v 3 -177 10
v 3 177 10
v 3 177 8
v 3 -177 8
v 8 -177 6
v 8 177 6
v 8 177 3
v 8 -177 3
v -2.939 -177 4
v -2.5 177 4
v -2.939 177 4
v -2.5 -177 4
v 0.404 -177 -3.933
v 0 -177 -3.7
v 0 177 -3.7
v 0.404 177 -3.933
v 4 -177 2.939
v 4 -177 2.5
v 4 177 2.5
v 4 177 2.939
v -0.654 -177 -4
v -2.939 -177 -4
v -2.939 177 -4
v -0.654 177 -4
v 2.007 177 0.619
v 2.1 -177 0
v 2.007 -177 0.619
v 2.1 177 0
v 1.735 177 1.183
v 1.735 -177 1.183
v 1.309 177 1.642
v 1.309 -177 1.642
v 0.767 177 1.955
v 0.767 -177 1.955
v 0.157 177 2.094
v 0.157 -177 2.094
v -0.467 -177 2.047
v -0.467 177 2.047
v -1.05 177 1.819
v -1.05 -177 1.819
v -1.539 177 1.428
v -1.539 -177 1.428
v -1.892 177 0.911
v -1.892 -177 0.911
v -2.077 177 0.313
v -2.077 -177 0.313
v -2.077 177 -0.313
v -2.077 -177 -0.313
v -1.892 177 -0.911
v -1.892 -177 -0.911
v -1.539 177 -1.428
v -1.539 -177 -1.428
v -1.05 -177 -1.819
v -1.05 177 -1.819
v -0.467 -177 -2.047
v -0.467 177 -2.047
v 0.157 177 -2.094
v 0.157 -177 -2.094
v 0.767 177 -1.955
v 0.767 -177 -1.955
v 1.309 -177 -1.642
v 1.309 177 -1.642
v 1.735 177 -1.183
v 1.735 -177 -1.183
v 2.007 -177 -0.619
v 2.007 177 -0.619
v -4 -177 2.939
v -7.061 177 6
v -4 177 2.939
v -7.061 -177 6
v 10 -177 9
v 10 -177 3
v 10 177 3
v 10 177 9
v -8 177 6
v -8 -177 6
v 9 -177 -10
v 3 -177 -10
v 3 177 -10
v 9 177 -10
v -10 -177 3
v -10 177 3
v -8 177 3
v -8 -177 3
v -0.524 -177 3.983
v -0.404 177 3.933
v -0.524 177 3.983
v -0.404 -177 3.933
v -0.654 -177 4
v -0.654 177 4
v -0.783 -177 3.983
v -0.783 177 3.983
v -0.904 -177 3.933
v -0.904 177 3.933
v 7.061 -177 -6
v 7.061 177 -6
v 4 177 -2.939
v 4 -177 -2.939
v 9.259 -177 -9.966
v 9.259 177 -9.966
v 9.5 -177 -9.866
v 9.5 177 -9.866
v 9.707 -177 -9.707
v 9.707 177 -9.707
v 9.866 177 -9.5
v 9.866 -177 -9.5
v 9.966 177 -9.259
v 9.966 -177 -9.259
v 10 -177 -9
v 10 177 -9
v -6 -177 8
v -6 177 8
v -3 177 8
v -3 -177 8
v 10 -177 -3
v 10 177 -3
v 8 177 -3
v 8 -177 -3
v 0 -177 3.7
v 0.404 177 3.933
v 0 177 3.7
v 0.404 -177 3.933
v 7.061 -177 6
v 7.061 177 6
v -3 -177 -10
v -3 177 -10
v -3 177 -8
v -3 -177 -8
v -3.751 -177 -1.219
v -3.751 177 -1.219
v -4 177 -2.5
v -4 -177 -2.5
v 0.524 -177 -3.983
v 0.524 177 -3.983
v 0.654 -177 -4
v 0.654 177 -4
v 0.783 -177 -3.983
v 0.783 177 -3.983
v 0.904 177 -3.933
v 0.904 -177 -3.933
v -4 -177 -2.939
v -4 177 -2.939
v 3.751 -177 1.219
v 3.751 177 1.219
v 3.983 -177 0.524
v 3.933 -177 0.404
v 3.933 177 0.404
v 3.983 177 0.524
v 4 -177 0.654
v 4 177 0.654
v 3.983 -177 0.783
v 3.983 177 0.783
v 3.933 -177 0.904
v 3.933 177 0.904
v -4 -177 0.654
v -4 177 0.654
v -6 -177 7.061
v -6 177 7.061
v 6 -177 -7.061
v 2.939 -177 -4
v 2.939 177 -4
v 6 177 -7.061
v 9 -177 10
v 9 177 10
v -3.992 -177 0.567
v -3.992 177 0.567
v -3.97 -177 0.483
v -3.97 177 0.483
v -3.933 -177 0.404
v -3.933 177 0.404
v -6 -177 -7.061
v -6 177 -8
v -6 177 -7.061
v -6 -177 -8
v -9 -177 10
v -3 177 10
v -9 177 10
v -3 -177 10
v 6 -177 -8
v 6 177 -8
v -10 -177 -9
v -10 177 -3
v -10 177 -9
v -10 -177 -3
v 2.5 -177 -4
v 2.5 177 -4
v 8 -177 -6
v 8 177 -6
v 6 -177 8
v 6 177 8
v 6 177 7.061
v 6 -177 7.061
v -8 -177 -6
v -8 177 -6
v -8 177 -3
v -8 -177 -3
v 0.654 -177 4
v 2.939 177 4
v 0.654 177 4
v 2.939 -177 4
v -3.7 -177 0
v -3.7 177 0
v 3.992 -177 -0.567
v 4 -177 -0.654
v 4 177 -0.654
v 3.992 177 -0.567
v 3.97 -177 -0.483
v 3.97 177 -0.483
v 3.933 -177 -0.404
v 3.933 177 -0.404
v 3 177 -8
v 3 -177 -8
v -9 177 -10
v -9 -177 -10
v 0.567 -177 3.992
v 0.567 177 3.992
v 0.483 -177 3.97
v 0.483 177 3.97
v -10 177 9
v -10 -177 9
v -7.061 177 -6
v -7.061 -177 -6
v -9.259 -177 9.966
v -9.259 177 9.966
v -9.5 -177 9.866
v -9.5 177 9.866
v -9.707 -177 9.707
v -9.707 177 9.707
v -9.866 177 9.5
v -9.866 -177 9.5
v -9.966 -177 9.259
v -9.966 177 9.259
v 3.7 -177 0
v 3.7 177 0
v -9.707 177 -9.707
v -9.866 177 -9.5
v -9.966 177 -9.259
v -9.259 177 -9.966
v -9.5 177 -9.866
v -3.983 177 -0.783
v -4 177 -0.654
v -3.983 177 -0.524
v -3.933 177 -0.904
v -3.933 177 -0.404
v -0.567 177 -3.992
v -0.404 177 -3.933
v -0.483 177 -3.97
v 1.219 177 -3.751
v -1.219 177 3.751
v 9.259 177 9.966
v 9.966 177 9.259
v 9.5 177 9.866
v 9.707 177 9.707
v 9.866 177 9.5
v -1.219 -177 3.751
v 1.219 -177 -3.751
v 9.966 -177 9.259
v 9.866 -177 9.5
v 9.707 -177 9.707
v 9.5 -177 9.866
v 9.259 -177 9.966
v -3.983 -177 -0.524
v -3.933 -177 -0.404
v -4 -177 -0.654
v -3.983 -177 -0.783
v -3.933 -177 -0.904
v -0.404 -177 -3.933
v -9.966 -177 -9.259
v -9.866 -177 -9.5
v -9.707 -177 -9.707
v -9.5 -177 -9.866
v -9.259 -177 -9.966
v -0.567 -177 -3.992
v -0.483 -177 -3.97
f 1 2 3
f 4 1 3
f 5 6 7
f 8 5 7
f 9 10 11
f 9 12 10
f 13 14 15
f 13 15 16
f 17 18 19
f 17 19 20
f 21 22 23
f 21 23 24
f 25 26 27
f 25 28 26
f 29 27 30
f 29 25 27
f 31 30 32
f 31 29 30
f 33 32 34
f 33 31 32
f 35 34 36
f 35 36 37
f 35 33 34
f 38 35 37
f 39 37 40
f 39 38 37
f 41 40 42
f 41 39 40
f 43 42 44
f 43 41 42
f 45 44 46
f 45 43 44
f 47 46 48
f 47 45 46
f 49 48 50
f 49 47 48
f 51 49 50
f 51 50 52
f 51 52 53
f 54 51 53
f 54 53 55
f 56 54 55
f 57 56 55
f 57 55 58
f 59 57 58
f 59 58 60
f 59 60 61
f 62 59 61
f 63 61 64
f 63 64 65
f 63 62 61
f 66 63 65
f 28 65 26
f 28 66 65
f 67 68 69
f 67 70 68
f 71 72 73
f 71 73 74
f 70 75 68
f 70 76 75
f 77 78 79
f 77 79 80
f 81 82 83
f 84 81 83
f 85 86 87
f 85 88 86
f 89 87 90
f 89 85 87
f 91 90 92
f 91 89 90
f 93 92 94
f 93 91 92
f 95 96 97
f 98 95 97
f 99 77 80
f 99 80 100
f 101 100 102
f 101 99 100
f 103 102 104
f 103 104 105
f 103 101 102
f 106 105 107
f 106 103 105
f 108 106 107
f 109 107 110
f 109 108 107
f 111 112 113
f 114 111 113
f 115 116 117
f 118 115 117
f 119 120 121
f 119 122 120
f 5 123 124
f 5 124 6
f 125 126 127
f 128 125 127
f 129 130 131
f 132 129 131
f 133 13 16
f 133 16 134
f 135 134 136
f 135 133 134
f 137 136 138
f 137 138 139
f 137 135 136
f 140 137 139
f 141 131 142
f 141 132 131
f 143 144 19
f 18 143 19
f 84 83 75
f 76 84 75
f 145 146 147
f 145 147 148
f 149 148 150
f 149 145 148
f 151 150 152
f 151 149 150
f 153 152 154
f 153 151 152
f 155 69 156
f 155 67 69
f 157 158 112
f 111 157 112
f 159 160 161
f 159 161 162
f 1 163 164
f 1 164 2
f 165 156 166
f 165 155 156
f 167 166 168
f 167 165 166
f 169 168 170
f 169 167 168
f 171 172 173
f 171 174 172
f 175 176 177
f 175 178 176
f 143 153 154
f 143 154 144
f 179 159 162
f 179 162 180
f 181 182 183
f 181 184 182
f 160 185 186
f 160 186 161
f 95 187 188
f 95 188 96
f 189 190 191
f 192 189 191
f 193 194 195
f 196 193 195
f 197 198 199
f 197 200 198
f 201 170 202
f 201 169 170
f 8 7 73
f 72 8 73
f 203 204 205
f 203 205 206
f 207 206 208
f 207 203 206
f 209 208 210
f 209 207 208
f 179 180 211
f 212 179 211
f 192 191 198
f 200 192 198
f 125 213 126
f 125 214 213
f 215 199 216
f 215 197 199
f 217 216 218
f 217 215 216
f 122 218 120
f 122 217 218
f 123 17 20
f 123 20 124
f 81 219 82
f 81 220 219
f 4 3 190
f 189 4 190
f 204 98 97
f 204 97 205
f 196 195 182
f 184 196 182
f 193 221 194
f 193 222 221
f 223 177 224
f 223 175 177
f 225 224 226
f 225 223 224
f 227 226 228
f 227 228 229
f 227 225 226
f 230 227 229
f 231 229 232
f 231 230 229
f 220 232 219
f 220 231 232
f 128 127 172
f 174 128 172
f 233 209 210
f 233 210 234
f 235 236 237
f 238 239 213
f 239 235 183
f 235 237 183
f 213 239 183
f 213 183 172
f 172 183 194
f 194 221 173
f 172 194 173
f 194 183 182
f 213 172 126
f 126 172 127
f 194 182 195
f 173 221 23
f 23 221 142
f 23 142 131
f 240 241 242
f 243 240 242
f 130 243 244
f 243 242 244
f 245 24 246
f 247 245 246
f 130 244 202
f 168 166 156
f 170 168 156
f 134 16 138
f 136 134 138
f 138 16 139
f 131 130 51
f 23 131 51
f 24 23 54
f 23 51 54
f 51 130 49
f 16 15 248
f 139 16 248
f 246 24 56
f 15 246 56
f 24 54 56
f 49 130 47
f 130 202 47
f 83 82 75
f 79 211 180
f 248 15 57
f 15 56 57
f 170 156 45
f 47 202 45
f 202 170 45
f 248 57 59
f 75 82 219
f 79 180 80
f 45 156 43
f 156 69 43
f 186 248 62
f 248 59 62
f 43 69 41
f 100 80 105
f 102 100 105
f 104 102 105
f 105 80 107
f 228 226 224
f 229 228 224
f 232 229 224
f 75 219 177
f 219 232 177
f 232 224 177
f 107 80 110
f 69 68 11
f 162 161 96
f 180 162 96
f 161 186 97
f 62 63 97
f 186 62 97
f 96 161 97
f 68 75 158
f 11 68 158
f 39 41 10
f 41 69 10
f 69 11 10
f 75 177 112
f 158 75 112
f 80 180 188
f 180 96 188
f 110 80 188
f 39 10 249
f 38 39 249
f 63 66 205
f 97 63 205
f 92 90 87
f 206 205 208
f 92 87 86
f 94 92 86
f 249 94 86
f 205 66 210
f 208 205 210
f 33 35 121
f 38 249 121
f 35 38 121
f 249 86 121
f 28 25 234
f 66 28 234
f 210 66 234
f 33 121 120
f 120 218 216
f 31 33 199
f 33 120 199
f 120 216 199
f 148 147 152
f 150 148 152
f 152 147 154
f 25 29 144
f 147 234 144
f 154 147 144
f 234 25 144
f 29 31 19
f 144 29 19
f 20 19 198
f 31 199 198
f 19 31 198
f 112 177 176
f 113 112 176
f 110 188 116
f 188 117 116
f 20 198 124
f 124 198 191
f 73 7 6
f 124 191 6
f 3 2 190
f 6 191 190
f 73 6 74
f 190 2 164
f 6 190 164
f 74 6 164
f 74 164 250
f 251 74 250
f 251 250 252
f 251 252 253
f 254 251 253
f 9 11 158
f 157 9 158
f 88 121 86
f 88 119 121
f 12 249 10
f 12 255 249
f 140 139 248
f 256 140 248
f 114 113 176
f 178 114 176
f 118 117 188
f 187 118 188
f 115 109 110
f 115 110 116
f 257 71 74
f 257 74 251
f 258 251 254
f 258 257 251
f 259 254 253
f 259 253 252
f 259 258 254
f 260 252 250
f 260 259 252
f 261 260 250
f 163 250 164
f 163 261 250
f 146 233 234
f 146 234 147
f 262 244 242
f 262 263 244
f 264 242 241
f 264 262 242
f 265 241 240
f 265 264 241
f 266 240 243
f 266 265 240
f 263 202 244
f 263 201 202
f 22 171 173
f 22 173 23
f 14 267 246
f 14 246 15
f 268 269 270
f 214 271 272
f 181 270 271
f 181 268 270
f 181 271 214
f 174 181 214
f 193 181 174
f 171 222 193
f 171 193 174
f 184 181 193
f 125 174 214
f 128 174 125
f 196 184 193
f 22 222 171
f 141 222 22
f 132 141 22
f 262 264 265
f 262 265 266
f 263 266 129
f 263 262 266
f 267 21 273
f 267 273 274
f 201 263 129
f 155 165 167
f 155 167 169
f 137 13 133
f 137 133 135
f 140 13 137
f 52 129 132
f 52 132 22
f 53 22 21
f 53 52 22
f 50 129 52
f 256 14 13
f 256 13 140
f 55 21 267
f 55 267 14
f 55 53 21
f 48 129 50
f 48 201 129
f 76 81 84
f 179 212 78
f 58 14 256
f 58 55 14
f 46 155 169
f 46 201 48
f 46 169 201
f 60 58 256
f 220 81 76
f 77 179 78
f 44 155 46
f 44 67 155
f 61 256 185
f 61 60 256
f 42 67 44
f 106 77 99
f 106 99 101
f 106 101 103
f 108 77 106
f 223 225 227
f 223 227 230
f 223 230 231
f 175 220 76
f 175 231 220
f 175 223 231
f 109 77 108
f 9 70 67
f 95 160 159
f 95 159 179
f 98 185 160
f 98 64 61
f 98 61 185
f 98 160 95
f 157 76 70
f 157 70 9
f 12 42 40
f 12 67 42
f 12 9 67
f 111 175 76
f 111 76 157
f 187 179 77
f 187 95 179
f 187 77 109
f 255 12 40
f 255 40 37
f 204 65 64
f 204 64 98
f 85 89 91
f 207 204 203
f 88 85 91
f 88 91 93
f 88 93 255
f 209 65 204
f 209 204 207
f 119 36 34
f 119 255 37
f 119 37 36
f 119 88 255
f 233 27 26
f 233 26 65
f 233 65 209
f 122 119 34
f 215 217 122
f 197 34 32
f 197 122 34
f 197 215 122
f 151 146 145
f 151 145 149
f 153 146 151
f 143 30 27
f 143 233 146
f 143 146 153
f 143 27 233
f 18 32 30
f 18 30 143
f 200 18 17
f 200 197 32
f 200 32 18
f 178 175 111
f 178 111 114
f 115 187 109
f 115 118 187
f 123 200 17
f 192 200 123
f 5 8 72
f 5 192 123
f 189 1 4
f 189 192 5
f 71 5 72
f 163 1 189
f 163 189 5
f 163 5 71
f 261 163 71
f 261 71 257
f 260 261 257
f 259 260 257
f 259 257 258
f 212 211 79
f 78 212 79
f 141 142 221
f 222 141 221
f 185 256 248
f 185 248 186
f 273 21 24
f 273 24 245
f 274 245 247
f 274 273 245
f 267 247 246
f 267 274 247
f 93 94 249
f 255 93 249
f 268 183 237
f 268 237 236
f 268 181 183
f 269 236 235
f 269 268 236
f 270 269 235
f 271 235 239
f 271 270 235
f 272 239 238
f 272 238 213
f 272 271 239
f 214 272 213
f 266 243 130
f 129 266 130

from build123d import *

# Parameters (mm, degrees)
F0_R     = 2.1
F1_DEPTH = 177


with BuildPart() as f1:
    # F0 (on Front) → F1 (new body, symmetric)
    with BuildSketch(Plane.XZ):
        with BuildLine():
            Line((-5.999985, -8.000007), (-5.999985, -7.060667))
            Line((-5.999985, -7.060667), (-2.939325, -4.000007))
            Line((-2.939325, -4.000007), (-0.653575, -4.000007))
            ThreePointArc((-0.653575, -4.000007), (-0.524165, -3.982969), (-0.403575, -3.933019))
            Line((-0.403575, -3.933019), (1.5e-05, -3.700007))
            Line((1.5e-05, -3.700007), (0.403605, -3.933019))
            ThreePointArc((0.403605, -3.933019), (0.653605, -4.000007), (0.903605, -3.933019))
            Line((0.903605, -3.933019), (1.218901, -3.750983))
            Line((1.218901, -3.750983), (2.500015, -4.000007))
            Line((2.500015, -4.000007), (2.939355, -4.000007))
            Line((2.939355, -4.000007), (6.000015, -7.060667))
            Line((6.000015, -7.060667), (6.000015, -8.000007))
            Line((6.000015, -8.000007), (3.000015, -8.000007))
            Line((3.000015, -8.000007), (3.000015, -10.000007))
            Line((3.000015, -10.000007), (9.000015, -10.000007))
            ThreePointArc((9.000015, -10.000007), (9.707122, -9.707113), (10.000015, -9.000007))
            Line((10.000015, -9.000007), (10.000015, -3.000007))
            Line((10.000015, -3.000007), (8.000015, -3.000007))
            Line((8.000015, -3.000007), (8.000015, -6.000007))
            Line((8.000015, -6.000007), (7.060675, -6.000007))
            Line((7.060675, -6.000007), (4.000015, -2.939346))
            Line((4.000015, -2.939346), (4.000015, -0.653596))
            ThreePointArc((4.000015, -0.653596), (3.982978, -0.524187), (3.933028, -0.403596))
            Line((3.933028, -0.403596), (3.700015, -7e-06))
            Line((3.700015, -7e-06), (3.933028, 0.403583))
            ThreePointArc((3.933028, 0.403583), (4.000015, 0.653583), (3.933028, 0.903583))
            Line((3.933028, 0.903583), (3.750992, 1.218879))
            Line((3.750992, 1.218879), (4.000015, 2.499993))
            Line((4.000015, 2.499993), (4.000015, 2.939333))
            Line((4.000015, 2.939333), (7.060675, 5.999993))
            Line((7.060675, 5.999993), (8.000015, 5.999993))
            Line((8.000015, 5.999993), (8.000015, 2.999993))
            Line((8.000015, 2.999993), (10.000015, 2.999993))
            Line((10.000015, 2.999993), (10.000015, 8.999993))
            ThreePointArc((10.000015, 8.999993), (9.707122, 9.7071), (9.000015, 9.999993))
            Line((9.000015, 9.999993), (3.000015, 9.999993))
            Line((3.000015, 9.999993), (3.000015, 7.999993))
            Line((3.000015, 7.999993), (6.000015, 7.999993))
            Line((6.000015, 7.999993), (6.000015, 7.060654))
            Line((6.000015, 7.060654), (2.939355, 3.999993))
            Line((2.939355, 3.999993), (0.653605, 3.999993))
            ThreePointArc((0.653605, 3.999993), (0.524195, 3.982956), (0.403605, 3.933006))
            Line((0.403605, 3.933006), (1.5e-05, 3.699993))
            Line((1.5e-05, 3.699993), (-0.403575, 3.933006))
            ThreePointArc((-0.403575, 3.933006), (-0.653575, 3.999993), (-0.903575, 3.933006))
            Line((-0.903575, 3.933006), (-1.218871, 3.75097))
            Line((-1.218871, 3.75097), (-2.499985, 3.999993))
            Line((-2.499985, 3.999993), (-2.939325, 3.999993))
            Line((-2.939325, 3.999993), (-5.999985, 7.060654))
            Line((-5.999985, 7.060654), (-5.999985, 7.999993))
            Line((-5.999985, 7.999993), (-2.999985, 7.999993))
            Line((-2.999985, 7.999993), (-2.999985, 9.999993))
            Line((-2.999985, 9.999993), (-8.999985, 9.999993))
            ThreePointArc((-8.999985, 9.999993), (-9.707092, 9.7071), (-9.999985, 8.999993))
            Line((-9.999985, 8.999993), (-9.999985, 2.999993))
            Line((-9.999985, 2.999993), (-7.999985, 2.999993))
            Line((-7.999985, 2.999993), (-7.999985, 5.999993))
            Line((-7.999985, 5.999993), (-7.060645, 5.999993))
            Line((-7.060645, 5.999993), (-3.999985, 2.939333))
            Line((-3.999985, 2.939333), (-3.999985, 0.653583))
            ThreePointArc((-3.999985, 0.653583), (-3.982948, 0.524174), (-3.932998, 0.403583))
            Line((-3.932998, 0.403583), (-3.699985, -7e-06))
            Line((-3.699985, -7e-06), (-3.932998, -0.403596))
            ThreePointArc((-3.932998, -0.403596), (-3.999985, -0.653596), (-3.932998, -0.903596))
            Line((-3.932998, -0.903596), (-3.750962, -1.218892))
            Line((-3.750962, -1.218892), (-3.999985, -2.500007))
            Line((-3.999985, -2.500007), (-3.999985, -2.939346))
            Line((-3.999985, -2.939346), (-7.060645, -6.000007))
            Line((-7.060645, -6.000007), (-7.999985, -6.000007))
            Line((-7.999985, -6.000007), (-7.999985, -3.000007))
            Line((-7.999985, -3.000007), (-9.999985, -3.000007))
            Line((-9.999985, -3.000007), (-9.999985, -9.000007))
            ThreePointArc((-9.999985, -9.000007), (-9.707092, -9.707113), (-8.999985, -10.000007))
            Line((-8.999985, -10.000007), (-2.999985, -10.000007))
            Line((-2.999985, -10.000007), (-2.999985, -8.000007))
            Line((-2.999985, -8.000007), (-5.999985, -8.000007))
        make_face()
        with Locations((1.5e-05, -7e-06)):
            Circle(F0_R, mode=Mode.SUBTRACT)
    extrude(amount=F1_DEPTH, both=True)


solid = f1.part
